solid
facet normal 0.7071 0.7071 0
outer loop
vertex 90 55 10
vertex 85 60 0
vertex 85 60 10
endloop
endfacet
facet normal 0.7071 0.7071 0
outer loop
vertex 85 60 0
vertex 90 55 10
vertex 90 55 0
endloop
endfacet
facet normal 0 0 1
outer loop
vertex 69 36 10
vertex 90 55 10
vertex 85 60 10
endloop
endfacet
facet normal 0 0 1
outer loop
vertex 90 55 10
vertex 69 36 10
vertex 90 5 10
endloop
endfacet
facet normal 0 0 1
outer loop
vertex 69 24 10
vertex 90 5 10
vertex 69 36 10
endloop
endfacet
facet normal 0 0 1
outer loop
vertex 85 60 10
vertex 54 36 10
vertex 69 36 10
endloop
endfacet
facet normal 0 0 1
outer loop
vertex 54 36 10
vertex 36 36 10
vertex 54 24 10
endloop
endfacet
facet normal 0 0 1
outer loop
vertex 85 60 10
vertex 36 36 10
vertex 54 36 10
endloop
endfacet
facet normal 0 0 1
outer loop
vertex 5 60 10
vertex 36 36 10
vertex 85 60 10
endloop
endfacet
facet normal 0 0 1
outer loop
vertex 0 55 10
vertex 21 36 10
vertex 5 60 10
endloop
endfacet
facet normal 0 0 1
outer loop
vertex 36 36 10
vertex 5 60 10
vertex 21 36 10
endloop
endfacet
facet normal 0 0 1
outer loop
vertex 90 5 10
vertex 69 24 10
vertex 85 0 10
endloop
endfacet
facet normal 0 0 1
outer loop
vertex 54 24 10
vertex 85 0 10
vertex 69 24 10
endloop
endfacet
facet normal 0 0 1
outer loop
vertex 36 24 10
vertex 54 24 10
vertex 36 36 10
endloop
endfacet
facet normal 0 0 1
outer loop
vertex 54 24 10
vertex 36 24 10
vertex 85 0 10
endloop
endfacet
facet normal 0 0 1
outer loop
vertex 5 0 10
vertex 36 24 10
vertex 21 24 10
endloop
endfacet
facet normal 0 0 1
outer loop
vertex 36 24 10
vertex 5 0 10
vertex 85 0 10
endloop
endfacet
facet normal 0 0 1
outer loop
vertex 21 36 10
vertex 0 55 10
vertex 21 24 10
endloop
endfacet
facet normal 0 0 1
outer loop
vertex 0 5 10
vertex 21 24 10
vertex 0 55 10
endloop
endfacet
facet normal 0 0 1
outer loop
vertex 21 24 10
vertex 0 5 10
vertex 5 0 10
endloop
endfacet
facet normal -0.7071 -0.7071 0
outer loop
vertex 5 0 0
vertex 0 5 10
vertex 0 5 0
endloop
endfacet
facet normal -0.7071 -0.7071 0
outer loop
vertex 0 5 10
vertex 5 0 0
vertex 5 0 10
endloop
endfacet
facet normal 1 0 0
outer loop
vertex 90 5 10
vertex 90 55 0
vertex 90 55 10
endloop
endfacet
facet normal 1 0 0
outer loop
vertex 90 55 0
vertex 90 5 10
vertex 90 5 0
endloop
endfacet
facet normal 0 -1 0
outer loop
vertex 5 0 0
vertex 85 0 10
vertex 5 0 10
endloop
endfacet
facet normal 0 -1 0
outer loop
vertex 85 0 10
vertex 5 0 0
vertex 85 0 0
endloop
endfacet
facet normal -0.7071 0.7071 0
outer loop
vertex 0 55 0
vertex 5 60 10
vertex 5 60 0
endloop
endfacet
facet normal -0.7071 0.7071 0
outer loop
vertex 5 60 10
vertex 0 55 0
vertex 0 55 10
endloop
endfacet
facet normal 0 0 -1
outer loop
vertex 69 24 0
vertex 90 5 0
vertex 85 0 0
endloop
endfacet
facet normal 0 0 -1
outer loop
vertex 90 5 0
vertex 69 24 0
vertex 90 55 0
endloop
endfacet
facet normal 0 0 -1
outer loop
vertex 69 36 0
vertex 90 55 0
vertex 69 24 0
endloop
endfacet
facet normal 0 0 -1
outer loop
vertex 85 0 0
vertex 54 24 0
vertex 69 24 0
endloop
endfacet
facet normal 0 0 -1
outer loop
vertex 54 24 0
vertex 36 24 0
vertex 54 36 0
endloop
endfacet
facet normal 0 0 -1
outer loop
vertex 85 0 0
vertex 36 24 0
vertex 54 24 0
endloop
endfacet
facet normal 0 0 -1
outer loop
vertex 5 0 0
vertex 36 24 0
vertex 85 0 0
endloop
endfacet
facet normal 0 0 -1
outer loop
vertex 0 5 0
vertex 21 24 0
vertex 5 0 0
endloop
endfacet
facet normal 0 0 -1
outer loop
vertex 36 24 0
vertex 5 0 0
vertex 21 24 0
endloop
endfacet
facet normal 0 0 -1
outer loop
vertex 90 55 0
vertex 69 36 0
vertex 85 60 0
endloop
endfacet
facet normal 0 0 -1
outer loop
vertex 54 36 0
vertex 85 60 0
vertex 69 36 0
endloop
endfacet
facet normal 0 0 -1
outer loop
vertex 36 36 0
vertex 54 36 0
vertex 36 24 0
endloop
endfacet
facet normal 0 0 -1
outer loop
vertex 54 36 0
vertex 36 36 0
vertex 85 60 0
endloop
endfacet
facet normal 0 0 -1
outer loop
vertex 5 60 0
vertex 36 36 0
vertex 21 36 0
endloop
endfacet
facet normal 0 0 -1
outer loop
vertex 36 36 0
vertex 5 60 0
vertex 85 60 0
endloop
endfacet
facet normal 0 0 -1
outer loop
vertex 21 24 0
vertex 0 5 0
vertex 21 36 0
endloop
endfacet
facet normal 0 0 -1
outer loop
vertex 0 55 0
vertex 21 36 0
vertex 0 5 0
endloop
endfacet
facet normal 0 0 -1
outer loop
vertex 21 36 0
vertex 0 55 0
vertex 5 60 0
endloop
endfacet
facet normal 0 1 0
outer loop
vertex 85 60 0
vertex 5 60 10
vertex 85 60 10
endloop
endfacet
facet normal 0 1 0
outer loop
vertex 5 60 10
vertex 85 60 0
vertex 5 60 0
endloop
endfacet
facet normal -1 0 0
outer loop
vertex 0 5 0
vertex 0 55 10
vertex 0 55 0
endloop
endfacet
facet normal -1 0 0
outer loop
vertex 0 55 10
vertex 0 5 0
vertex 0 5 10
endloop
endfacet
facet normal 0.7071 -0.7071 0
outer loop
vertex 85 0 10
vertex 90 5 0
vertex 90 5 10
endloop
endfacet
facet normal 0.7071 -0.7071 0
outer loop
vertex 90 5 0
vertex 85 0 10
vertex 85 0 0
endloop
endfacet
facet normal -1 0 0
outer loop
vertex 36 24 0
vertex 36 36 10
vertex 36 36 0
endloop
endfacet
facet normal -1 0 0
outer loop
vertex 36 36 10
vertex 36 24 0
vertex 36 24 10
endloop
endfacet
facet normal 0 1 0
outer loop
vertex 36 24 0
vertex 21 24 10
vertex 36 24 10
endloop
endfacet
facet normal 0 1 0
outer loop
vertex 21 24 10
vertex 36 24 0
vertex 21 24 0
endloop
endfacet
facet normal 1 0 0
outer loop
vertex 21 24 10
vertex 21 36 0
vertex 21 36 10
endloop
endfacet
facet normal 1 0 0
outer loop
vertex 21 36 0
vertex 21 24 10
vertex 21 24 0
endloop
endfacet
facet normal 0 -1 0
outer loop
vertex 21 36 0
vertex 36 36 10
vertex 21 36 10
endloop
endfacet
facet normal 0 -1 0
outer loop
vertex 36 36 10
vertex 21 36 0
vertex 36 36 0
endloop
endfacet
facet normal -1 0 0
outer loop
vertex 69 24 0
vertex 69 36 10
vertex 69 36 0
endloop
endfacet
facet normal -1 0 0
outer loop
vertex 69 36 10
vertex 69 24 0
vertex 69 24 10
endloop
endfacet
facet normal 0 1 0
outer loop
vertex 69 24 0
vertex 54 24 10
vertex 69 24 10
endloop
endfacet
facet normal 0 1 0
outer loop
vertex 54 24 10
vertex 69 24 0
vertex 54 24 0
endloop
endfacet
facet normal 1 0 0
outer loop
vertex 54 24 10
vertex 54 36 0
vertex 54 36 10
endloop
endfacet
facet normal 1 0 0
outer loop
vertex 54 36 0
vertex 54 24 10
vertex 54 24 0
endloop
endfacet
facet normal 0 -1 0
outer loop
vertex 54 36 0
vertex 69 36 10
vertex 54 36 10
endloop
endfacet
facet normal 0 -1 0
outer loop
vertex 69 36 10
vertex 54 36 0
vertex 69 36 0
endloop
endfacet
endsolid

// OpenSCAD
$fn = 32;

// ----------------------------------------------------------------------
// Windowed plate: 2 voids, 90 x 60 x 10 mm
// ----------------------------------------------------------------------

// --- parameters (mm) ---
plate_l = 90;             // plate length, X
plate_w = 60;             // plate width, Y
plate_t = 10;             // plate thickness, Z
edge_margin = 12;         // wall from the plate edge to any window
windows = 2;              // number of windows in the row
win_l = 15;               // window length
win_w = 12;               // window width
win_pitch = 33;           // window pitch along X
depth_1 = 10;             // depth of void 1 (full thickness = through)
depth_2 = 10;             // depth of void 2 (full thickness = through)
corner_c = 5;             // corner chamfer of the plate

profile = [[5, 0], [85, 0], [90, 5], [90, 55], [85, 60], [5, 60], [0, 55], [0, 5]];  // primary outline, 8 points, counter clockwise
void_1 = [[21, 24], [36, 24], [36, 36], [21, 36]];  // window 1 of the row, 4 points
void_2 = [[54, 24], [69, 24], [69, 36], [54, 36]];  // window 2 of the row, 4 points

// --- the one profile operation ---
difference() {
  linear_extrude(height = plate_t) polygon(points = profile);
  translate([0, 0, -1])
    linear_extrude(height = plate_t + 2) polygon(points = void_1);
  translate([0, 0, -1])
    linear_extrude(height = plate_t + 2) polygon(points = void_2);
}
